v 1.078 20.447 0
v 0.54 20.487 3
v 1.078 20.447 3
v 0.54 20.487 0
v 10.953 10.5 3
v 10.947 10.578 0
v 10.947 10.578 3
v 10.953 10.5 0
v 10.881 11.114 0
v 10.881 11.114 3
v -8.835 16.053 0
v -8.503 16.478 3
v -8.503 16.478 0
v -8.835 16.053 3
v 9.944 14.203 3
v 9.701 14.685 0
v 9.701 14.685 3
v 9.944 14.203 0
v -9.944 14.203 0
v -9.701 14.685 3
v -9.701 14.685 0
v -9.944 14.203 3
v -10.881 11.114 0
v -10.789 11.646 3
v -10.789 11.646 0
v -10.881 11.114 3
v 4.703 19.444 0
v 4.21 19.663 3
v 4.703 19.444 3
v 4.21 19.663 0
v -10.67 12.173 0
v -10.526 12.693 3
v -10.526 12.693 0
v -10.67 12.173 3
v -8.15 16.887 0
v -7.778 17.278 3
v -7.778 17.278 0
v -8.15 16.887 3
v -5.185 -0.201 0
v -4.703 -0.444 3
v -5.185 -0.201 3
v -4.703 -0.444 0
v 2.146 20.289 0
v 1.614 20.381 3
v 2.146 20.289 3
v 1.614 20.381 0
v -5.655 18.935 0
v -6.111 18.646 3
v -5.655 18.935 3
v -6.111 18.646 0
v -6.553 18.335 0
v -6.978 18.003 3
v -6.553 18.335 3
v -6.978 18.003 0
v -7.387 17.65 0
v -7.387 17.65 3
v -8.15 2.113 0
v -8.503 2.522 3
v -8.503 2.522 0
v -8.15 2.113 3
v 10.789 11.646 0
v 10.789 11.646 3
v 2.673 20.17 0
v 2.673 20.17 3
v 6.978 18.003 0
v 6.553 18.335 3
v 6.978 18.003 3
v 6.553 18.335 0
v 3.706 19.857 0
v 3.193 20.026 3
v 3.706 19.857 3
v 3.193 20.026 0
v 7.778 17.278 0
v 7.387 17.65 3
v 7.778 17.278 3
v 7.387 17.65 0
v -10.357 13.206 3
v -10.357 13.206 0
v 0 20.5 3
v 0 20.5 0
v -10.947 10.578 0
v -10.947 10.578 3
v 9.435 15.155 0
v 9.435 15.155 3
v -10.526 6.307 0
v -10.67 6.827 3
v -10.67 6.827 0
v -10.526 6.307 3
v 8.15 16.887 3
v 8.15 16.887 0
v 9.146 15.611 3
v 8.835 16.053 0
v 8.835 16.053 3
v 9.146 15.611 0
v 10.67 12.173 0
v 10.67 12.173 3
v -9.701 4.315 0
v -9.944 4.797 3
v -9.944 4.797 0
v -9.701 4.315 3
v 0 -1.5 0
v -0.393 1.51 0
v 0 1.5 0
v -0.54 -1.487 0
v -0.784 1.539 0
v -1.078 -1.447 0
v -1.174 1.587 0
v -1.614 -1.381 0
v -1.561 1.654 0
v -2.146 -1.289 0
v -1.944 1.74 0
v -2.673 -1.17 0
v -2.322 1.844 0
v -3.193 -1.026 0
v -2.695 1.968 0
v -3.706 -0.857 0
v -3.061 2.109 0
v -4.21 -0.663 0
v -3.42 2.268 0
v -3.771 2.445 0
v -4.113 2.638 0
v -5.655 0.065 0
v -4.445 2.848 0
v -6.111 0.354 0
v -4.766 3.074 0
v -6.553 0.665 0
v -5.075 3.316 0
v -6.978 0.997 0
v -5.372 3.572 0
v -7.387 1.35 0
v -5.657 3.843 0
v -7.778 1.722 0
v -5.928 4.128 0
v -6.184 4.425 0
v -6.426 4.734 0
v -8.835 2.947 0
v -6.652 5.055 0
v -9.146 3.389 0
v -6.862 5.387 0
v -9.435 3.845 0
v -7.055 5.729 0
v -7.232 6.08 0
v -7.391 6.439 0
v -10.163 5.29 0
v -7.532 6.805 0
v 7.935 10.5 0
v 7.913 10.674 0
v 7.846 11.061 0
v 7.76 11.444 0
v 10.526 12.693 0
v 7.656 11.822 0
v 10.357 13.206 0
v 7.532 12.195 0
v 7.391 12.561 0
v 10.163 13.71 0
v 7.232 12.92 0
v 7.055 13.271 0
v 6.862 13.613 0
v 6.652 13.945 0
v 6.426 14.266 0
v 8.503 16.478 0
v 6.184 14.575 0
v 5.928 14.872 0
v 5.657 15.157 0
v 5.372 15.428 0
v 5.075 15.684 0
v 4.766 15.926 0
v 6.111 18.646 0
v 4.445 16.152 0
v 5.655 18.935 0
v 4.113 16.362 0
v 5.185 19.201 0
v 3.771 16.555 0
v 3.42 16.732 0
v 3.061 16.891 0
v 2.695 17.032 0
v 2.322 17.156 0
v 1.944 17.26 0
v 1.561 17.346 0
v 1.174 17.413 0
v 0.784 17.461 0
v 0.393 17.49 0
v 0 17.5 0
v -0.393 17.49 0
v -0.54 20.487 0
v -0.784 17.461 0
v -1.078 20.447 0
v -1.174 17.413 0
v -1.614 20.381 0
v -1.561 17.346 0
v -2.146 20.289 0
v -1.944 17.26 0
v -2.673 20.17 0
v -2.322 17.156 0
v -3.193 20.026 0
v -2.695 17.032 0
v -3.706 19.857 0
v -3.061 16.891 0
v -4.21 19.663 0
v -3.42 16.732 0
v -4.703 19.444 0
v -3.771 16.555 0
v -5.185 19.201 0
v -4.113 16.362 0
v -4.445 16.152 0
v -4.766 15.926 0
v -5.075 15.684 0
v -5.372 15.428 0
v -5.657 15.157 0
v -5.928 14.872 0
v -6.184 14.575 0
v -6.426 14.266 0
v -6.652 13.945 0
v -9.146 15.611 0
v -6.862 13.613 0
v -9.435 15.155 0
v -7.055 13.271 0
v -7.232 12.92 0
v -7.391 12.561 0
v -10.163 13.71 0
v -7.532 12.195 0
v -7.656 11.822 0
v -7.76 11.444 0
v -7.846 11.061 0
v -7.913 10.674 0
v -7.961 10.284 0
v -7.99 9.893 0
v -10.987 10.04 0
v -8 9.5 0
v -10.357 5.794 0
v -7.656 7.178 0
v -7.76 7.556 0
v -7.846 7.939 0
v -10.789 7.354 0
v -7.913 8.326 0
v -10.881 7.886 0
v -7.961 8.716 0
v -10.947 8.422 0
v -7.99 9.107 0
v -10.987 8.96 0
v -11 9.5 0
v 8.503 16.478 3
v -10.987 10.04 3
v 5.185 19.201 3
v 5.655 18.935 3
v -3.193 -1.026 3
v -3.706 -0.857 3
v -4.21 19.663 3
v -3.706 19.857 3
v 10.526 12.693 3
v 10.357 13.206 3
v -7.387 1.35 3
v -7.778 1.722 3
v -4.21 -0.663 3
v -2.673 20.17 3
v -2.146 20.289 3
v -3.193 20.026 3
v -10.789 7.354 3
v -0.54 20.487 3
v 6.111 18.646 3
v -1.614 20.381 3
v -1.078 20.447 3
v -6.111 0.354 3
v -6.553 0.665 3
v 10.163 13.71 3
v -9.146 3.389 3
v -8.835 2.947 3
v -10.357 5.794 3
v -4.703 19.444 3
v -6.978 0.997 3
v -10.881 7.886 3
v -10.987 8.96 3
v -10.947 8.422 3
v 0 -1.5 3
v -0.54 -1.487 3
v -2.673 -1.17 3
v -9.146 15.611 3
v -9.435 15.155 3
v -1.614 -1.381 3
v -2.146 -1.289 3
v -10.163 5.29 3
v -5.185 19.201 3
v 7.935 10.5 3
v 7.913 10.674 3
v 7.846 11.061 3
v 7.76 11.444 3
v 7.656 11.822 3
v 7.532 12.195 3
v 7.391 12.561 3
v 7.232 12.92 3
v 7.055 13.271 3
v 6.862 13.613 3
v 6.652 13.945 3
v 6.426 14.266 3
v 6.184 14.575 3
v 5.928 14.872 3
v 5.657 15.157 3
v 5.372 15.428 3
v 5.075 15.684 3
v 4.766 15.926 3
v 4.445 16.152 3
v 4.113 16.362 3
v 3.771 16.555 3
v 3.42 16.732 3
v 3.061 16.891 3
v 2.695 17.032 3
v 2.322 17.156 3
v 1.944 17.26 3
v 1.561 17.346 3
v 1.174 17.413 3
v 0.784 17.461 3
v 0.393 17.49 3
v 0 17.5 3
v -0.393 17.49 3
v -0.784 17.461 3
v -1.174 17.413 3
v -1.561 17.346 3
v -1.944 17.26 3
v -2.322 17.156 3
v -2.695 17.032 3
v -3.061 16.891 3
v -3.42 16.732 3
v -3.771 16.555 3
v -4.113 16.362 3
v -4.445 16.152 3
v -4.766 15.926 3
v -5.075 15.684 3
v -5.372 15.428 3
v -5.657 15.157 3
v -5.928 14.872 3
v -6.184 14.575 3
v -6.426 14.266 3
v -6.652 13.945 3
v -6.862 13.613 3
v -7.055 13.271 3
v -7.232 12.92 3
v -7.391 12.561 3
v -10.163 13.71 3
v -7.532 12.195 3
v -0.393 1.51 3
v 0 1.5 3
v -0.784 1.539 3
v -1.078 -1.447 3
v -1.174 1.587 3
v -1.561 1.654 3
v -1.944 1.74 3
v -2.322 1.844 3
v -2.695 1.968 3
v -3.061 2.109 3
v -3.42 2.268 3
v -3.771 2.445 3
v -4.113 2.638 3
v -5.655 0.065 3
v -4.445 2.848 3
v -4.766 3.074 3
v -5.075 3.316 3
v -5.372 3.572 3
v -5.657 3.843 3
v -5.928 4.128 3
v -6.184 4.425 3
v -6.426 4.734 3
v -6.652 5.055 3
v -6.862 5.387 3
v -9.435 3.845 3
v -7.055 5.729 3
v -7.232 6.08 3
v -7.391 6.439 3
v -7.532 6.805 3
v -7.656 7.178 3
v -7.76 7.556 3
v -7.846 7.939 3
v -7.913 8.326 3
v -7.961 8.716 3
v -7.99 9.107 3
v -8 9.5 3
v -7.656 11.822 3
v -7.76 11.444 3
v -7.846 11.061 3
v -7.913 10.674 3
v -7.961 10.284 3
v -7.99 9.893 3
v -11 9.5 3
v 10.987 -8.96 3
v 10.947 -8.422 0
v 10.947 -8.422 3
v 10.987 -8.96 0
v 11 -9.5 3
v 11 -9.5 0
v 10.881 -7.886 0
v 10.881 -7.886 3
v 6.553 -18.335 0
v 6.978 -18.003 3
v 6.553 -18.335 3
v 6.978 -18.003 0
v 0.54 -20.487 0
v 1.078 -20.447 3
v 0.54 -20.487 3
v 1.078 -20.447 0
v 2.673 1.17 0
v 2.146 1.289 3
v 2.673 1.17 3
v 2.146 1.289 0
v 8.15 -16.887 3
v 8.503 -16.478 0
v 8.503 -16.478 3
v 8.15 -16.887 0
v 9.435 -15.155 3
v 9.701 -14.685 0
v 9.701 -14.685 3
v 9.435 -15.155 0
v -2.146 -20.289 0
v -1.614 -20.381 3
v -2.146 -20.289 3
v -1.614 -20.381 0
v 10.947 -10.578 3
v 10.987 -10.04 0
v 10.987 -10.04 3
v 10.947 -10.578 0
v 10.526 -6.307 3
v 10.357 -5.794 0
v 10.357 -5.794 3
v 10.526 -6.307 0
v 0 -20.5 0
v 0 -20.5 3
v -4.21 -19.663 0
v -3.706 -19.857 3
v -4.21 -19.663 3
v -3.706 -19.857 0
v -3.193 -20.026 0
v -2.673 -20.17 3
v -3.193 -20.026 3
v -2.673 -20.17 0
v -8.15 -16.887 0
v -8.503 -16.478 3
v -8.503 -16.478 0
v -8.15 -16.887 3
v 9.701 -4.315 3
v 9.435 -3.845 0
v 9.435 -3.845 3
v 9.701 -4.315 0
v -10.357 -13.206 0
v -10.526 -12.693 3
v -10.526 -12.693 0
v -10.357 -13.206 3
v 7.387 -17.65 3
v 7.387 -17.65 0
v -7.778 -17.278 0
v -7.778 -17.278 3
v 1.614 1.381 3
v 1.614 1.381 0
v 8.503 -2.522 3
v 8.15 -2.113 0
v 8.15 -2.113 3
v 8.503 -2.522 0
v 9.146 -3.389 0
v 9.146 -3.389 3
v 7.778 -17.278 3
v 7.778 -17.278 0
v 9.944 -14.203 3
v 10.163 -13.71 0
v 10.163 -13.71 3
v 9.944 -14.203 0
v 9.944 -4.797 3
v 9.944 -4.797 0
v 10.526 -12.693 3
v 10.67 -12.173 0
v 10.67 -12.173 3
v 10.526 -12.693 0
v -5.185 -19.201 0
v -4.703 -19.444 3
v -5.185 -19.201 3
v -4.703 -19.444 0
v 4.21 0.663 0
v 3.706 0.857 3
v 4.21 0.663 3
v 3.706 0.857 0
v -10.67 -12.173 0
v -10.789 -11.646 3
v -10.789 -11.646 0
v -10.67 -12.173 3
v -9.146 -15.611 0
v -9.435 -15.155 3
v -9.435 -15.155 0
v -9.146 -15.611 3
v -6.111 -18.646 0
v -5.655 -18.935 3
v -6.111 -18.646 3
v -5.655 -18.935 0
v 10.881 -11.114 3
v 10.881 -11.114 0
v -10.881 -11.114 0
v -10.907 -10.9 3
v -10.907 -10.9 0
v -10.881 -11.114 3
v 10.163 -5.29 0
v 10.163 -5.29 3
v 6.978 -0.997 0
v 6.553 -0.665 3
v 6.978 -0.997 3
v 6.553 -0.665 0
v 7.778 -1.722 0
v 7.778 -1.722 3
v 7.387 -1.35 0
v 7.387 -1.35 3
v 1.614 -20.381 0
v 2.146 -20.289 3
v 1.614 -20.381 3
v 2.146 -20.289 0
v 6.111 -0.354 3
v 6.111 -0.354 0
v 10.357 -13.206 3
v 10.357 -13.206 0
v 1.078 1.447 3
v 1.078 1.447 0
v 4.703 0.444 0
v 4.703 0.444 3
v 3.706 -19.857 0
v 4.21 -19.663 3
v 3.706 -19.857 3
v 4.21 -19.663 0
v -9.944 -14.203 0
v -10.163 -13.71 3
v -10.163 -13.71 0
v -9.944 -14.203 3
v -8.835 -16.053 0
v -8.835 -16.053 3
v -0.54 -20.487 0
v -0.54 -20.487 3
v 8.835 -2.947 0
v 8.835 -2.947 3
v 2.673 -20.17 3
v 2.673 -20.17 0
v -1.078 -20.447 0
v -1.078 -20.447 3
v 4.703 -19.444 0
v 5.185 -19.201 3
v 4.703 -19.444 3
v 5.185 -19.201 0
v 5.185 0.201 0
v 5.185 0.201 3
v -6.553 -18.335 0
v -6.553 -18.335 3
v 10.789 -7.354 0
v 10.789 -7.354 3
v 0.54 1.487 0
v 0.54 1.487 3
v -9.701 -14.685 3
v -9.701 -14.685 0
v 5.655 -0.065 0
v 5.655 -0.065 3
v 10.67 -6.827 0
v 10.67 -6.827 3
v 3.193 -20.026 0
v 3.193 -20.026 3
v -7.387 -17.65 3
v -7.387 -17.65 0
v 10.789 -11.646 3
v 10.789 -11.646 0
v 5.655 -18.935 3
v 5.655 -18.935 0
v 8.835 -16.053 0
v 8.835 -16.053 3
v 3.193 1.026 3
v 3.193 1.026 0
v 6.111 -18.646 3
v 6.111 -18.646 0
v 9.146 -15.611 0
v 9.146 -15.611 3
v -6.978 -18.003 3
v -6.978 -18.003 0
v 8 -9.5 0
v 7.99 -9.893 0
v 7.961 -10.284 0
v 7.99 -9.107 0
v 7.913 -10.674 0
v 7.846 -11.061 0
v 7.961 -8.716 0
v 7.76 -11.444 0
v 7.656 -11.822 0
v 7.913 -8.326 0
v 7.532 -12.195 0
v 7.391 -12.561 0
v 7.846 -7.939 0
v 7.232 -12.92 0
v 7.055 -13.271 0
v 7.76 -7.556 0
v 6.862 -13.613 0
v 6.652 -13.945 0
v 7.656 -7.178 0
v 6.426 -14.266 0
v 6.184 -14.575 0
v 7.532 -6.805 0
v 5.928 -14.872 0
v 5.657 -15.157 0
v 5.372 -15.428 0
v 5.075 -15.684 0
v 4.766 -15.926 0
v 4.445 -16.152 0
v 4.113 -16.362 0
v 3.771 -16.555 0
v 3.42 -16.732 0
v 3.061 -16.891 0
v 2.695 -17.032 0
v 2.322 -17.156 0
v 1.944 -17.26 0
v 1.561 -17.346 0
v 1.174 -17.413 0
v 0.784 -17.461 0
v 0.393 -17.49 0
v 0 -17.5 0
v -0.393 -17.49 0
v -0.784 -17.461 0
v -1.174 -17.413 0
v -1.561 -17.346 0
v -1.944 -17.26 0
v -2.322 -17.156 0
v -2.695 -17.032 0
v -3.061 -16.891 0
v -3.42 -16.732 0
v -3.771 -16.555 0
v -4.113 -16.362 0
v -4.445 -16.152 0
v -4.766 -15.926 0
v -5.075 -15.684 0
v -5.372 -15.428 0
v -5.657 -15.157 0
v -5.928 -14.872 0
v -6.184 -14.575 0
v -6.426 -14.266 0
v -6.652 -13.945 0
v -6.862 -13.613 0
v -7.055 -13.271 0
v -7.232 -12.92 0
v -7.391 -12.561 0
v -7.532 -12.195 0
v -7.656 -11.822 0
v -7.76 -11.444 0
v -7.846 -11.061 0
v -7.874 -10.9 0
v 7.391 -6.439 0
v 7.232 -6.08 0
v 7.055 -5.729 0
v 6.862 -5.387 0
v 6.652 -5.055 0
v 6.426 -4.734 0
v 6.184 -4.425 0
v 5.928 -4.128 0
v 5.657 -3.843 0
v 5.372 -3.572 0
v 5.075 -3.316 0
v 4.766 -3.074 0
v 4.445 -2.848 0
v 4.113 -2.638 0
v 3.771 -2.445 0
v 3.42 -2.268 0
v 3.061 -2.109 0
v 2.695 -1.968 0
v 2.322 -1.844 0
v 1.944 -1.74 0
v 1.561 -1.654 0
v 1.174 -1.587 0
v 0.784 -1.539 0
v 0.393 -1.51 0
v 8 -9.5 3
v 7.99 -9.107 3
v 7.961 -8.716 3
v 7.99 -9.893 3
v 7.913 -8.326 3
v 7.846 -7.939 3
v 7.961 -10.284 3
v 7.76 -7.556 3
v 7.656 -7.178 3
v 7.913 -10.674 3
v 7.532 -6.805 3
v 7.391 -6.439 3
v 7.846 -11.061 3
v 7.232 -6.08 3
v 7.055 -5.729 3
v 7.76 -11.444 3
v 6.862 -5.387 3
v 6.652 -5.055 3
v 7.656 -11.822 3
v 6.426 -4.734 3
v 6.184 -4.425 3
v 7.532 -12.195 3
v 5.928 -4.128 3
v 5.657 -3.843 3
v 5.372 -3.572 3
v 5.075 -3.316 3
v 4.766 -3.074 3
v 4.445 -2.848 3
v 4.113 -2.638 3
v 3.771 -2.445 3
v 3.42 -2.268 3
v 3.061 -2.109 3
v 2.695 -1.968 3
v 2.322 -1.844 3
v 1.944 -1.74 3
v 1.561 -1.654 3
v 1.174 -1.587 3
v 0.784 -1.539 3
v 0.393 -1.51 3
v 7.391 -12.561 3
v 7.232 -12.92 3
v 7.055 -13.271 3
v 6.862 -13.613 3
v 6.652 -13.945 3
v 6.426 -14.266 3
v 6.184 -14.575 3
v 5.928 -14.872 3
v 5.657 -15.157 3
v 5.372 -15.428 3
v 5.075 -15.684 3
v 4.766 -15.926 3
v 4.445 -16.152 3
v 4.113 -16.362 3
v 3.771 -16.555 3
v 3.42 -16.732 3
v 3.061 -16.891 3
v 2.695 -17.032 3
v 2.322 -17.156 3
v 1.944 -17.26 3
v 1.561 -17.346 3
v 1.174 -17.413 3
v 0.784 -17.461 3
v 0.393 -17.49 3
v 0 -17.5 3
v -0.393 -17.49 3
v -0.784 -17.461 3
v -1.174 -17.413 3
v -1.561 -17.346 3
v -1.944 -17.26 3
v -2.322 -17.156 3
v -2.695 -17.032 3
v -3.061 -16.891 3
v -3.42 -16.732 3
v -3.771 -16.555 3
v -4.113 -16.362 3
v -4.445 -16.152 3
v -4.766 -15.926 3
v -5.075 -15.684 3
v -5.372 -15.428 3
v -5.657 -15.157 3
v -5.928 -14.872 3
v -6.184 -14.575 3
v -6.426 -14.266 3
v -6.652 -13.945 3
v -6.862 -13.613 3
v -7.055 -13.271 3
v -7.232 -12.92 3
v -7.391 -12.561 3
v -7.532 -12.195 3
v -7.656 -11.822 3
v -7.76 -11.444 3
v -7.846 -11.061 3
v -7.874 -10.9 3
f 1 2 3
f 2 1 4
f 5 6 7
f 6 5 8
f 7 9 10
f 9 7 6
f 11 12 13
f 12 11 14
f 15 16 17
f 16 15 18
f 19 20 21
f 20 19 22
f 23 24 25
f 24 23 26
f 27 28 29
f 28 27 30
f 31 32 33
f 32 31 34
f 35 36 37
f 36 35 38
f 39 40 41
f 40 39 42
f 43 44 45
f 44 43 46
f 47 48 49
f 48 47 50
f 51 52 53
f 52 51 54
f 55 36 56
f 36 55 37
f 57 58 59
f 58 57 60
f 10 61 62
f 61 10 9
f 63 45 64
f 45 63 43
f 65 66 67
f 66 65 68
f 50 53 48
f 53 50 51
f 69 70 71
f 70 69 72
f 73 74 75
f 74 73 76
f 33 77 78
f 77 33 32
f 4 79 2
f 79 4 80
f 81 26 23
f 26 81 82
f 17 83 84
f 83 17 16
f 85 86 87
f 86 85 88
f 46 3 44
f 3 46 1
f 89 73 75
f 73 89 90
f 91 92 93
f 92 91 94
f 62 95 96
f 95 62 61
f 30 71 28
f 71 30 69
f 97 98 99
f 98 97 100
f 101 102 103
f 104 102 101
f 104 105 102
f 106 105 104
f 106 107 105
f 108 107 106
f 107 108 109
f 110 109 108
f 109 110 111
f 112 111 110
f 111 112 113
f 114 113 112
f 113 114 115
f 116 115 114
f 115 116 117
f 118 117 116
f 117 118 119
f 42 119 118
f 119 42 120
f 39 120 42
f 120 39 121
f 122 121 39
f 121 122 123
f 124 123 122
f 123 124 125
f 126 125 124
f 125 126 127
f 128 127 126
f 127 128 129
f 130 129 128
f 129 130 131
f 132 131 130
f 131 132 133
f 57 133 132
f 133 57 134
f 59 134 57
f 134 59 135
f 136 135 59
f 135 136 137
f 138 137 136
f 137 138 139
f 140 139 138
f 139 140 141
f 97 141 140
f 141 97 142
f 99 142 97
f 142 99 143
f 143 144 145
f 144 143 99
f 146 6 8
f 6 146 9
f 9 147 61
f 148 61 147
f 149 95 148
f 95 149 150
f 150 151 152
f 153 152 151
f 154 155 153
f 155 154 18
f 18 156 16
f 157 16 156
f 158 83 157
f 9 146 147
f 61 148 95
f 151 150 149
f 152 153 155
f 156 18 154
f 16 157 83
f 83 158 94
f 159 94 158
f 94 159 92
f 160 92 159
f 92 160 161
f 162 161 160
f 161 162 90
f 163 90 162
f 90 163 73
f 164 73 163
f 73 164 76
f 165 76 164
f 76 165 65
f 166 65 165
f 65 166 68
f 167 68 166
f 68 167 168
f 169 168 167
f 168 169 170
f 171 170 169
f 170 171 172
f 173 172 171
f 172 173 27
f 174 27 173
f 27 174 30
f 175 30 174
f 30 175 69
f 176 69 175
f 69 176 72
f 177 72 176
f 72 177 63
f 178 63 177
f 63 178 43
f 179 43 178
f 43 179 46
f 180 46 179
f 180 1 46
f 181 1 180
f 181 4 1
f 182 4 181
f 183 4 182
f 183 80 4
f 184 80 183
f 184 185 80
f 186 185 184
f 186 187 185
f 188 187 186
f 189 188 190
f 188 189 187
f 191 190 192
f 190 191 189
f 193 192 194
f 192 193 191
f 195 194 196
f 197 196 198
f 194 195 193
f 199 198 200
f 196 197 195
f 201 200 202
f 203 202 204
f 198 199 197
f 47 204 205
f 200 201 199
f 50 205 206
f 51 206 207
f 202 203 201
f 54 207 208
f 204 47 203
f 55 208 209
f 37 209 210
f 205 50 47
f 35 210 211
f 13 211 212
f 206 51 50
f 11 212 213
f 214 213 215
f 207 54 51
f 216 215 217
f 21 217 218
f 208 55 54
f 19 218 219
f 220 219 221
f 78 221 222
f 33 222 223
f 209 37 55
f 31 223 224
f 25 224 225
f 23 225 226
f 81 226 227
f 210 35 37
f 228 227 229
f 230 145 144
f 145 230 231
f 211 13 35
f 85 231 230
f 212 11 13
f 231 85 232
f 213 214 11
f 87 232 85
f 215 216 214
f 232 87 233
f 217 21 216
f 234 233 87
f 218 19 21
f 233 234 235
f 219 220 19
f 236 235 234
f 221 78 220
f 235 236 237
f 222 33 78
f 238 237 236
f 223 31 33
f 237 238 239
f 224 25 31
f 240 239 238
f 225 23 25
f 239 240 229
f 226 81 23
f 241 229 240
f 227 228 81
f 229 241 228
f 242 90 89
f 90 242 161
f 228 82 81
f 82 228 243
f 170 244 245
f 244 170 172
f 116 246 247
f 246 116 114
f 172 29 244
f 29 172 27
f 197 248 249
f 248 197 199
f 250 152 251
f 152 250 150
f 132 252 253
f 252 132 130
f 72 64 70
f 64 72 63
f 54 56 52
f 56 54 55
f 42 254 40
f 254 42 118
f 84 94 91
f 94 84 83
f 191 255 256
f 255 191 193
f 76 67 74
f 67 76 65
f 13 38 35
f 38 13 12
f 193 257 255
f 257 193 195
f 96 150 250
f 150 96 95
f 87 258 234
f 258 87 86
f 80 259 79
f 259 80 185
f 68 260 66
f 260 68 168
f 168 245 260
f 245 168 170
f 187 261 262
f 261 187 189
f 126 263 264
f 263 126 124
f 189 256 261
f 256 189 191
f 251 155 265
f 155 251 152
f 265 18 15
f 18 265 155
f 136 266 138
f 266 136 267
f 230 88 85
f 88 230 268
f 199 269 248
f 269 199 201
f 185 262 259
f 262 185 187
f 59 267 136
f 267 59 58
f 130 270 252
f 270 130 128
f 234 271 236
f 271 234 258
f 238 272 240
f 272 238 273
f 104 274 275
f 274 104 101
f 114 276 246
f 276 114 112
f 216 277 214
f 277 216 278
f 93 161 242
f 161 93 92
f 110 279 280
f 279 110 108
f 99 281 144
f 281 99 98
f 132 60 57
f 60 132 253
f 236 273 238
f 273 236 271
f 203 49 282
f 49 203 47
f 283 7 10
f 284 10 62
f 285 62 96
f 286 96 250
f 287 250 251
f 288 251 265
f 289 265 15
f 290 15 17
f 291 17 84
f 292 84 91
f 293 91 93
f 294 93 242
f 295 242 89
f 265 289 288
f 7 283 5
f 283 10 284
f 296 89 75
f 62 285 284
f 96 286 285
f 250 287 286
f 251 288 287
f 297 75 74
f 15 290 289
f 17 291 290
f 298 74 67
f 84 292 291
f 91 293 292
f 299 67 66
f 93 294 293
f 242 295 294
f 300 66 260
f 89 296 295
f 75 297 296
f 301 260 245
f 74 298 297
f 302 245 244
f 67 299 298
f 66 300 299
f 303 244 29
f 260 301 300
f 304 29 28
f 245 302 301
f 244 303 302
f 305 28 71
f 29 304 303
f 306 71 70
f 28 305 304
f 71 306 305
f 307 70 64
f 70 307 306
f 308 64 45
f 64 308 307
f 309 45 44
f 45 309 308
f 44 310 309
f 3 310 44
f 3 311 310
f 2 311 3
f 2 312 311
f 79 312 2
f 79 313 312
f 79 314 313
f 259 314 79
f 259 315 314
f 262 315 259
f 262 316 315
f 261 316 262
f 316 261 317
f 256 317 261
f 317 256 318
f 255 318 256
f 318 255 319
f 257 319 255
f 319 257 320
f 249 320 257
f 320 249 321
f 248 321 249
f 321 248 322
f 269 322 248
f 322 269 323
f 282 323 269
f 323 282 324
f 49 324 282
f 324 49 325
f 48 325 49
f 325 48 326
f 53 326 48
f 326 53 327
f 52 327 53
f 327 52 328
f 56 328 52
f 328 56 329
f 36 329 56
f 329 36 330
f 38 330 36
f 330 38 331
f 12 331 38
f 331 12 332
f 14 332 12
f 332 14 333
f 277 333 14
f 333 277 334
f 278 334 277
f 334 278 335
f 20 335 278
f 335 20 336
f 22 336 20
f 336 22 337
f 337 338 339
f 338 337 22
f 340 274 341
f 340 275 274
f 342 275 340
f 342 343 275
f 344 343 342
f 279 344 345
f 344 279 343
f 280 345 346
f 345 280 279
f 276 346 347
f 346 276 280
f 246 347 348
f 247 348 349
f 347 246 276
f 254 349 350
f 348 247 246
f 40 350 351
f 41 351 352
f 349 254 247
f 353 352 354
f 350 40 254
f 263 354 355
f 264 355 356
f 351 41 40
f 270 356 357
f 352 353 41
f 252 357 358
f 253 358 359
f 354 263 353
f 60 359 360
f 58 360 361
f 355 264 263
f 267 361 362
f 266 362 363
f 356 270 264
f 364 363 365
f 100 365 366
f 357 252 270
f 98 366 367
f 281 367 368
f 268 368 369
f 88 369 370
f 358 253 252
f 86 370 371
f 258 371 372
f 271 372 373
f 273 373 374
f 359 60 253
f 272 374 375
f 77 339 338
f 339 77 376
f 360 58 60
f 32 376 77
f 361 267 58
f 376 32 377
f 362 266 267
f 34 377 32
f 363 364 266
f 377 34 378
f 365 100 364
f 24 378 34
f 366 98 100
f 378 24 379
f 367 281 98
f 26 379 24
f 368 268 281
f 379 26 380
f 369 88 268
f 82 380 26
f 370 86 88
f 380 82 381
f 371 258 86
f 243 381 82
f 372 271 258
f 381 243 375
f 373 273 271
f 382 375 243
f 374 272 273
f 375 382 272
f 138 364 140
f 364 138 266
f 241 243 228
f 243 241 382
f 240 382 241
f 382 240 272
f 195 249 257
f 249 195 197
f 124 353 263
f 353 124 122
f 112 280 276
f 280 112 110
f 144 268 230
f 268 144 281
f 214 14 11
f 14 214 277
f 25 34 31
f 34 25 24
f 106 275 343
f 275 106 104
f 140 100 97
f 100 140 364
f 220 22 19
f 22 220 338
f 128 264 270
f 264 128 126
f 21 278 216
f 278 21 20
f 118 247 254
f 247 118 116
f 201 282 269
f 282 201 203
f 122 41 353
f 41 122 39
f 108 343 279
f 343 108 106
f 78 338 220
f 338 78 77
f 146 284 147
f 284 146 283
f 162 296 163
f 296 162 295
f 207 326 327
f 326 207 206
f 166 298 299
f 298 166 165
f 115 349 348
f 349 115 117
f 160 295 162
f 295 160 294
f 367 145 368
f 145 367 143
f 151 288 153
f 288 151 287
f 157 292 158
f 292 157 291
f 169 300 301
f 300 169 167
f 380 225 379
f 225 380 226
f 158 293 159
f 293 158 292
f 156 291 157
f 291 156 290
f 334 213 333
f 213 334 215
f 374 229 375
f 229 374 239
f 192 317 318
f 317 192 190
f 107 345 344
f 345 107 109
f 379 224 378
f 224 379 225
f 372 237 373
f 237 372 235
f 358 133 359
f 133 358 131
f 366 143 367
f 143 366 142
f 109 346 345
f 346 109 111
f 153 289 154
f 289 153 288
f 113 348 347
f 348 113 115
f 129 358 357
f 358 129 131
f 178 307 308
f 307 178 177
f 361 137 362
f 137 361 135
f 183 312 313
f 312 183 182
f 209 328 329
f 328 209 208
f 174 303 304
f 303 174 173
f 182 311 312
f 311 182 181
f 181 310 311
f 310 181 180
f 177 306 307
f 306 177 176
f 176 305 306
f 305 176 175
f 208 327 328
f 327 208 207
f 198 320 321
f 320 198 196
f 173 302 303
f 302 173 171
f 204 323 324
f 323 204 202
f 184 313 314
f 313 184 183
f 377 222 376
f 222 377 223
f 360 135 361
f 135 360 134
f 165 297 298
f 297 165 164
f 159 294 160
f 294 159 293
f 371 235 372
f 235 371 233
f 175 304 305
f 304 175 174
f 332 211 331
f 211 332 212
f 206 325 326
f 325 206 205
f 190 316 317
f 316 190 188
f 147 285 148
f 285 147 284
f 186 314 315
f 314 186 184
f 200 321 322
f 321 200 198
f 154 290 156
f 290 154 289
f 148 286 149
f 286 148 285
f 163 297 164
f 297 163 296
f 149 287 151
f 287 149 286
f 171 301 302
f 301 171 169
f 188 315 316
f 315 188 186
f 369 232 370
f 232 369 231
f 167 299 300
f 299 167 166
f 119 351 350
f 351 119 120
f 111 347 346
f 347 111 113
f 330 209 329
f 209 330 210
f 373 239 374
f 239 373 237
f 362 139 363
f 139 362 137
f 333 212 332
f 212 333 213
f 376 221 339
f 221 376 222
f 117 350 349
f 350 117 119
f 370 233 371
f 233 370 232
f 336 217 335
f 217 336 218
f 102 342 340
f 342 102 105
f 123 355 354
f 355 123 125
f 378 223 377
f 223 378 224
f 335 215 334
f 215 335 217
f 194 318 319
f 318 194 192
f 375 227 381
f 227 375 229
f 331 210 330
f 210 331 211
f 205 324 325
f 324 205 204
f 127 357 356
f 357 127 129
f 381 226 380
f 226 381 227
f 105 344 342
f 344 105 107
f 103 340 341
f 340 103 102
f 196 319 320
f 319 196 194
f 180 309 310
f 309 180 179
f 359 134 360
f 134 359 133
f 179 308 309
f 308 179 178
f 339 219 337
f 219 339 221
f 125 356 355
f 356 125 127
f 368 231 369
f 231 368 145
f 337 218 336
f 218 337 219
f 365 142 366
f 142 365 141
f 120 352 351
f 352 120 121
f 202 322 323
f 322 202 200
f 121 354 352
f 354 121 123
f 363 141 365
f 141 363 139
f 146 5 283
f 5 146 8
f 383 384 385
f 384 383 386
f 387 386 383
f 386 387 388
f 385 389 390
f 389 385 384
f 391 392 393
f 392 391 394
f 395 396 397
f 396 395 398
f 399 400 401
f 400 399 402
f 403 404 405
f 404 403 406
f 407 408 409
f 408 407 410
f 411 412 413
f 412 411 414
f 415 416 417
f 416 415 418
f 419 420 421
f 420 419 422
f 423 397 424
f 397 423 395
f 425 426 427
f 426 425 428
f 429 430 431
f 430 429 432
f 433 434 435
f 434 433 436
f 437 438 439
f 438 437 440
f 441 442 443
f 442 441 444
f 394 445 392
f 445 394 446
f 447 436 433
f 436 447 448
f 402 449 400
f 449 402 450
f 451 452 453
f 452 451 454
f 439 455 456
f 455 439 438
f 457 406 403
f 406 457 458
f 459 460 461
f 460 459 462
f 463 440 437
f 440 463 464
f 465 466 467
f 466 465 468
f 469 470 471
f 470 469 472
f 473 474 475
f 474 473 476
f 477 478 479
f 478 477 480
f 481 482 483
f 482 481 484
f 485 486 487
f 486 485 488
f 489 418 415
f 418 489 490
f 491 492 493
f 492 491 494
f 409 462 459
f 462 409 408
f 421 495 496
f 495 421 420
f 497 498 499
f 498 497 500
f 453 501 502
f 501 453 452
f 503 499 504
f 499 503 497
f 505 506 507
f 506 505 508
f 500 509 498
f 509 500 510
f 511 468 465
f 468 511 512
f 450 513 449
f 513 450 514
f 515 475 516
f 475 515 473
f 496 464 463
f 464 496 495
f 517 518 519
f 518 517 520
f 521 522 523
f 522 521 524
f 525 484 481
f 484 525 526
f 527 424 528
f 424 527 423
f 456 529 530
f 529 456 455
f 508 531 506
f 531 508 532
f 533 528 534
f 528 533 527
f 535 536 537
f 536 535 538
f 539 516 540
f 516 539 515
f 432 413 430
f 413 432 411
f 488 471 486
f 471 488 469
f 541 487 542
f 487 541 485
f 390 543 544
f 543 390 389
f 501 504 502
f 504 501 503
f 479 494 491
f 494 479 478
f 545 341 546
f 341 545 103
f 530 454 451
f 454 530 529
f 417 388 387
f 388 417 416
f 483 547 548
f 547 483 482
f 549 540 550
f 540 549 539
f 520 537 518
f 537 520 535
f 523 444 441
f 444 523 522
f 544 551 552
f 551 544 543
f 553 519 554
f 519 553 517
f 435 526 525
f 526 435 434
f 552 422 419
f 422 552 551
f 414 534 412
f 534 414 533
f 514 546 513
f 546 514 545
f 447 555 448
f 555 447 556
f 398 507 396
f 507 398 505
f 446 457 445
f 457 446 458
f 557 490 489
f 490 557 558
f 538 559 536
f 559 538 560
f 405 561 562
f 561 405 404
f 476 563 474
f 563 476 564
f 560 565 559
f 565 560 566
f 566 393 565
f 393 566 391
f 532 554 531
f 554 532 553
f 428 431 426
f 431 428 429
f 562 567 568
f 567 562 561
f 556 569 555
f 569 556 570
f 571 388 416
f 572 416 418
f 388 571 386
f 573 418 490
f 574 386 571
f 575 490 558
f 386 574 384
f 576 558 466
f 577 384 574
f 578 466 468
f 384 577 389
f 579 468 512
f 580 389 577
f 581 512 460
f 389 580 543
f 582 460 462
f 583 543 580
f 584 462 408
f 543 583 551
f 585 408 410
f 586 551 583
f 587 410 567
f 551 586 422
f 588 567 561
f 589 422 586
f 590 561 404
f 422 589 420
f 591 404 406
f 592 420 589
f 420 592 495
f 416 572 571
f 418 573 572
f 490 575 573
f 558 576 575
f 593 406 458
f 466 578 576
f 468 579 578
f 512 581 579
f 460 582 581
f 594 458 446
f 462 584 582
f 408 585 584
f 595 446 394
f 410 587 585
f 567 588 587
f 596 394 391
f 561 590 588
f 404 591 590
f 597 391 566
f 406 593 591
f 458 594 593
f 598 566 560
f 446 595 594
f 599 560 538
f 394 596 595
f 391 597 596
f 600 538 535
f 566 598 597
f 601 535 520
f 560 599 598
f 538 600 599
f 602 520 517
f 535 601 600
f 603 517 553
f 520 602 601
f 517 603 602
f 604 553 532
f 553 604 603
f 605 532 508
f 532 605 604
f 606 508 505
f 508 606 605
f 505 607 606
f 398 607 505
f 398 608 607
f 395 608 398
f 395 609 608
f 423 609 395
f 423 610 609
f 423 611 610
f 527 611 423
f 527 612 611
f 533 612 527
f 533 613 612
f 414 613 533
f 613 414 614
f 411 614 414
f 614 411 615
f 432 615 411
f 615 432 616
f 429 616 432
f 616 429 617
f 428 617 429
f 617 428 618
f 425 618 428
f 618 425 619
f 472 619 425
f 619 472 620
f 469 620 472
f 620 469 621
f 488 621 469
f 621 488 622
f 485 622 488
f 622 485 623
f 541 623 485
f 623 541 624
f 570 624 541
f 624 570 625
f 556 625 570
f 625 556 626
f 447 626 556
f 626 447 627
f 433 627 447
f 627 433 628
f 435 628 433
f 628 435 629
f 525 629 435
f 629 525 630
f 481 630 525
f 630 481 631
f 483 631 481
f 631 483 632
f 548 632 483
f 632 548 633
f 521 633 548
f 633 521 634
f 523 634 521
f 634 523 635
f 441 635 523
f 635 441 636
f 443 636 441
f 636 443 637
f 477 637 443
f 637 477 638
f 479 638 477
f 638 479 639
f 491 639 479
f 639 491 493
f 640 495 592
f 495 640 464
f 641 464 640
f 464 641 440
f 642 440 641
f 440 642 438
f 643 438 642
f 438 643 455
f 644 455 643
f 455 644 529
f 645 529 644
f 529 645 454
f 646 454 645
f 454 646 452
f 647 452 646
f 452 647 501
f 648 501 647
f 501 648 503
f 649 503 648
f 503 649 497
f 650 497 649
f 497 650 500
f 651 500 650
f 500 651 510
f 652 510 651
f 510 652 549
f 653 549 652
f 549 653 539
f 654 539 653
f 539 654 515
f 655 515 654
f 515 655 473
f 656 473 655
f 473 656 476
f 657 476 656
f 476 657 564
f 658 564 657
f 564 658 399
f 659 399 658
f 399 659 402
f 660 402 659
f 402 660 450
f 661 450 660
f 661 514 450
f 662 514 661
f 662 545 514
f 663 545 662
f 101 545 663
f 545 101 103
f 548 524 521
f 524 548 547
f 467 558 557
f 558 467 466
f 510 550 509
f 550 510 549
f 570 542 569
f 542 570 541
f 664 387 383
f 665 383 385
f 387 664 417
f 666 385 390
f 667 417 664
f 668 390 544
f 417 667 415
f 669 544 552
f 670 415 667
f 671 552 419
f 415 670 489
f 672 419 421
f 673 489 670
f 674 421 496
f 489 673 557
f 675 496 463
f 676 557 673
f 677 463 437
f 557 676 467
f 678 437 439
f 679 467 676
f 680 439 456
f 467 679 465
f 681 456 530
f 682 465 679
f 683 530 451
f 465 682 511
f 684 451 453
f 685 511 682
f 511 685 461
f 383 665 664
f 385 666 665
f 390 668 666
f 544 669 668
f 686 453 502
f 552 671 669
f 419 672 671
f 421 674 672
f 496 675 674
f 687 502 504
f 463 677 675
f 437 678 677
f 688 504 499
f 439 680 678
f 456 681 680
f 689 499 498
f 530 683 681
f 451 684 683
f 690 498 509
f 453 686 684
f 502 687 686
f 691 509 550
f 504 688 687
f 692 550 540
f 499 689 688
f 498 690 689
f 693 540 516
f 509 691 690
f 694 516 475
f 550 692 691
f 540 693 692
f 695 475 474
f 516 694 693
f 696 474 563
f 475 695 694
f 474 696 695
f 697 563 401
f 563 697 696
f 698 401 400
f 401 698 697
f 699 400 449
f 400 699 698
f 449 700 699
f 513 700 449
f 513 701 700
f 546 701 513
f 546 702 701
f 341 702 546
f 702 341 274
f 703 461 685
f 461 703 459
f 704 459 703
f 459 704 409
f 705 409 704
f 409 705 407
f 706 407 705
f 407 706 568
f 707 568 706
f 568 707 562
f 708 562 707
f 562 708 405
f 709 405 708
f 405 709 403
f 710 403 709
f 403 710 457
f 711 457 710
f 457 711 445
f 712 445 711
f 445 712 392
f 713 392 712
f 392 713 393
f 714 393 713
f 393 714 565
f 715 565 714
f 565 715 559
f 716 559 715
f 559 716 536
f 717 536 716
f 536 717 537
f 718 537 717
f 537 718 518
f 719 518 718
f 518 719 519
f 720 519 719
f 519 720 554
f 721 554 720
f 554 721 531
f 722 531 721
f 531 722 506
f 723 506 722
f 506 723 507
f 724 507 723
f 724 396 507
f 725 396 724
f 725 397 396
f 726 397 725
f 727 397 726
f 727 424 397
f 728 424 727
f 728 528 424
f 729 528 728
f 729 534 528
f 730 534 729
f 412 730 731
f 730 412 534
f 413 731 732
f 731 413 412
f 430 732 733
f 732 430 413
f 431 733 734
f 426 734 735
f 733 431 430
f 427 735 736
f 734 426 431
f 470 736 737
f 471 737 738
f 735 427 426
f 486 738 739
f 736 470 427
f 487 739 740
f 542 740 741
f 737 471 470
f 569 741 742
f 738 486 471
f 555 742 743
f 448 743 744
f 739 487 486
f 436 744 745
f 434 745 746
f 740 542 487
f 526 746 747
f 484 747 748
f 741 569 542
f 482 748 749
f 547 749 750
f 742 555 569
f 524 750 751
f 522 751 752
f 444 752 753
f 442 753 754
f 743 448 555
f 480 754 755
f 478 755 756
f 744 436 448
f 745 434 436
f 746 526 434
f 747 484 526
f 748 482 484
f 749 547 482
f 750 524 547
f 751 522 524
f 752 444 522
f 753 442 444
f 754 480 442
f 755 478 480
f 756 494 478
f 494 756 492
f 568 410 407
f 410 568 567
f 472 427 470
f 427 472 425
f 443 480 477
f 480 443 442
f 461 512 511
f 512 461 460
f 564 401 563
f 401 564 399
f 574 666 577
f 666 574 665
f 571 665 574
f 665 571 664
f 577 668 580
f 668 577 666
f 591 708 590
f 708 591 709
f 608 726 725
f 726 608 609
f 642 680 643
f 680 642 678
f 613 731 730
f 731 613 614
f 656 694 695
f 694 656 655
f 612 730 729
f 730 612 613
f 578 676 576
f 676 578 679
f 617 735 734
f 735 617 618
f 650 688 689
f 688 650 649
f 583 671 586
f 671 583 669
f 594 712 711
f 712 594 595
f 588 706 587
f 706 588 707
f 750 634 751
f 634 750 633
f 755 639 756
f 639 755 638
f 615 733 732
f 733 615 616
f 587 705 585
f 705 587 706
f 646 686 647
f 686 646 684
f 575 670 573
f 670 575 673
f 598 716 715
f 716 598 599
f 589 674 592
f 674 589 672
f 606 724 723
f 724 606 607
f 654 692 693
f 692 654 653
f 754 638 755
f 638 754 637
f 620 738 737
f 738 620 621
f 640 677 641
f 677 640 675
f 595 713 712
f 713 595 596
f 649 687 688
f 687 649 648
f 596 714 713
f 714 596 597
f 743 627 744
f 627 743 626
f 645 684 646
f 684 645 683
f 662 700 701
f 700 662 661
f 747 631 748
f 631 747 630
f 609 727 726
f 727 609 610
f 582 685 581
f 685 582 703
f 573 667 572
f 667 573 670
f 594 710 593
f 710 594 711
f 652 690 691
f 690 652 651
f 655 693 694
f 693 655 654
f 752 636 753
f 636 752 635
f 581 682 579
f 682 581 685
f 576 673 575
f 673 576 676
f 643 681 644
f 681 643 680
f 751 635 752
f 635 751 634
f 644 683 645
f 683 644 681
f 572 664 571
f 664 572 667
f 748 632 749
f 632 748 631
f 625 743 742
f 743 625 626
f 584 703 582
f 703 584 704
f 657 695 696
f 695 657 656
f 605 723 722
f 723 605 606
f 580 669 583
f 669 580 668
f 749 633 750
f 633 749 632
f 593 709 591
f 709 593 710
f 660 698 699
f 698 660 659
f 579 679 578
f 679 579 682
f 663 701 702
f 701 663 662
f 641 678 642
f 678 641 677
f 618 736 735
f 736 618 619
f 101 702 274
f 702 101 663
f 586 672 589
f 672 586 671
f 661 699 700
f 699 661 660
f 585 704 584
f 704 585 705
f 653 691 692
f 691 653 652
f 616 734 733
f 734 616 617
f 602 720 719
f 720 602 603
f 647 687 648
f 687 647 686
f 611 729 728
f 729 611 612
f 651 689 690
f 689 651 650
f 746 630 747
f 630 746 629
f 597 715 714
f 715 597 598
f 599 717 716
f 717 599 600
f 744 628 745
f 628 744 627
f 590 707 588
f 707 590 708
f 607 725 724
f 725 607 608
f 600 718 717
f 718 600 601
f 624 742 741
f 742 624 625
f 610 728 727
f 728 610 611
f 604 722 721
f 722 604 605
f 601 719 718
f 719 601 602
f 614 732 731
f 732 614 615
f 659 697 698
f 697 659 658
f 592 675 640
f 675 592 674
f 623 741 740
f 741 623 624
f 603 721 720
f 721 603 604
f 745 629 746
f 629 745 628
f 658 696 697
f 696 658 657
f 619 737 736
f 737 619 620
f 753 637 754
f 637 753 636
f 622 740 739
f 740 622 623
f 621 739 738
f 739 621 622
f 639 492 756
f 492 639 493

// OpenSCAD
$fn=128;
union(){
translate([0,0.5,0]){
difference(){
  translate([0,9,0]) cylinder(3,11,11);
  translate([0,9,-1]) cylinder(5,8,8);
  translate([0,-3,-1]) cube([15,13,5]);
}

} 
translate([0,-0.5,0]){
difference(){
  translate([0,-9,0]) cylinder(3,11,11);
  translate([0,-9,-1]) cylinder(5,8,8);
 translate([-15,-10.4,-1]) cube([15,13,5]);
}
}
}
